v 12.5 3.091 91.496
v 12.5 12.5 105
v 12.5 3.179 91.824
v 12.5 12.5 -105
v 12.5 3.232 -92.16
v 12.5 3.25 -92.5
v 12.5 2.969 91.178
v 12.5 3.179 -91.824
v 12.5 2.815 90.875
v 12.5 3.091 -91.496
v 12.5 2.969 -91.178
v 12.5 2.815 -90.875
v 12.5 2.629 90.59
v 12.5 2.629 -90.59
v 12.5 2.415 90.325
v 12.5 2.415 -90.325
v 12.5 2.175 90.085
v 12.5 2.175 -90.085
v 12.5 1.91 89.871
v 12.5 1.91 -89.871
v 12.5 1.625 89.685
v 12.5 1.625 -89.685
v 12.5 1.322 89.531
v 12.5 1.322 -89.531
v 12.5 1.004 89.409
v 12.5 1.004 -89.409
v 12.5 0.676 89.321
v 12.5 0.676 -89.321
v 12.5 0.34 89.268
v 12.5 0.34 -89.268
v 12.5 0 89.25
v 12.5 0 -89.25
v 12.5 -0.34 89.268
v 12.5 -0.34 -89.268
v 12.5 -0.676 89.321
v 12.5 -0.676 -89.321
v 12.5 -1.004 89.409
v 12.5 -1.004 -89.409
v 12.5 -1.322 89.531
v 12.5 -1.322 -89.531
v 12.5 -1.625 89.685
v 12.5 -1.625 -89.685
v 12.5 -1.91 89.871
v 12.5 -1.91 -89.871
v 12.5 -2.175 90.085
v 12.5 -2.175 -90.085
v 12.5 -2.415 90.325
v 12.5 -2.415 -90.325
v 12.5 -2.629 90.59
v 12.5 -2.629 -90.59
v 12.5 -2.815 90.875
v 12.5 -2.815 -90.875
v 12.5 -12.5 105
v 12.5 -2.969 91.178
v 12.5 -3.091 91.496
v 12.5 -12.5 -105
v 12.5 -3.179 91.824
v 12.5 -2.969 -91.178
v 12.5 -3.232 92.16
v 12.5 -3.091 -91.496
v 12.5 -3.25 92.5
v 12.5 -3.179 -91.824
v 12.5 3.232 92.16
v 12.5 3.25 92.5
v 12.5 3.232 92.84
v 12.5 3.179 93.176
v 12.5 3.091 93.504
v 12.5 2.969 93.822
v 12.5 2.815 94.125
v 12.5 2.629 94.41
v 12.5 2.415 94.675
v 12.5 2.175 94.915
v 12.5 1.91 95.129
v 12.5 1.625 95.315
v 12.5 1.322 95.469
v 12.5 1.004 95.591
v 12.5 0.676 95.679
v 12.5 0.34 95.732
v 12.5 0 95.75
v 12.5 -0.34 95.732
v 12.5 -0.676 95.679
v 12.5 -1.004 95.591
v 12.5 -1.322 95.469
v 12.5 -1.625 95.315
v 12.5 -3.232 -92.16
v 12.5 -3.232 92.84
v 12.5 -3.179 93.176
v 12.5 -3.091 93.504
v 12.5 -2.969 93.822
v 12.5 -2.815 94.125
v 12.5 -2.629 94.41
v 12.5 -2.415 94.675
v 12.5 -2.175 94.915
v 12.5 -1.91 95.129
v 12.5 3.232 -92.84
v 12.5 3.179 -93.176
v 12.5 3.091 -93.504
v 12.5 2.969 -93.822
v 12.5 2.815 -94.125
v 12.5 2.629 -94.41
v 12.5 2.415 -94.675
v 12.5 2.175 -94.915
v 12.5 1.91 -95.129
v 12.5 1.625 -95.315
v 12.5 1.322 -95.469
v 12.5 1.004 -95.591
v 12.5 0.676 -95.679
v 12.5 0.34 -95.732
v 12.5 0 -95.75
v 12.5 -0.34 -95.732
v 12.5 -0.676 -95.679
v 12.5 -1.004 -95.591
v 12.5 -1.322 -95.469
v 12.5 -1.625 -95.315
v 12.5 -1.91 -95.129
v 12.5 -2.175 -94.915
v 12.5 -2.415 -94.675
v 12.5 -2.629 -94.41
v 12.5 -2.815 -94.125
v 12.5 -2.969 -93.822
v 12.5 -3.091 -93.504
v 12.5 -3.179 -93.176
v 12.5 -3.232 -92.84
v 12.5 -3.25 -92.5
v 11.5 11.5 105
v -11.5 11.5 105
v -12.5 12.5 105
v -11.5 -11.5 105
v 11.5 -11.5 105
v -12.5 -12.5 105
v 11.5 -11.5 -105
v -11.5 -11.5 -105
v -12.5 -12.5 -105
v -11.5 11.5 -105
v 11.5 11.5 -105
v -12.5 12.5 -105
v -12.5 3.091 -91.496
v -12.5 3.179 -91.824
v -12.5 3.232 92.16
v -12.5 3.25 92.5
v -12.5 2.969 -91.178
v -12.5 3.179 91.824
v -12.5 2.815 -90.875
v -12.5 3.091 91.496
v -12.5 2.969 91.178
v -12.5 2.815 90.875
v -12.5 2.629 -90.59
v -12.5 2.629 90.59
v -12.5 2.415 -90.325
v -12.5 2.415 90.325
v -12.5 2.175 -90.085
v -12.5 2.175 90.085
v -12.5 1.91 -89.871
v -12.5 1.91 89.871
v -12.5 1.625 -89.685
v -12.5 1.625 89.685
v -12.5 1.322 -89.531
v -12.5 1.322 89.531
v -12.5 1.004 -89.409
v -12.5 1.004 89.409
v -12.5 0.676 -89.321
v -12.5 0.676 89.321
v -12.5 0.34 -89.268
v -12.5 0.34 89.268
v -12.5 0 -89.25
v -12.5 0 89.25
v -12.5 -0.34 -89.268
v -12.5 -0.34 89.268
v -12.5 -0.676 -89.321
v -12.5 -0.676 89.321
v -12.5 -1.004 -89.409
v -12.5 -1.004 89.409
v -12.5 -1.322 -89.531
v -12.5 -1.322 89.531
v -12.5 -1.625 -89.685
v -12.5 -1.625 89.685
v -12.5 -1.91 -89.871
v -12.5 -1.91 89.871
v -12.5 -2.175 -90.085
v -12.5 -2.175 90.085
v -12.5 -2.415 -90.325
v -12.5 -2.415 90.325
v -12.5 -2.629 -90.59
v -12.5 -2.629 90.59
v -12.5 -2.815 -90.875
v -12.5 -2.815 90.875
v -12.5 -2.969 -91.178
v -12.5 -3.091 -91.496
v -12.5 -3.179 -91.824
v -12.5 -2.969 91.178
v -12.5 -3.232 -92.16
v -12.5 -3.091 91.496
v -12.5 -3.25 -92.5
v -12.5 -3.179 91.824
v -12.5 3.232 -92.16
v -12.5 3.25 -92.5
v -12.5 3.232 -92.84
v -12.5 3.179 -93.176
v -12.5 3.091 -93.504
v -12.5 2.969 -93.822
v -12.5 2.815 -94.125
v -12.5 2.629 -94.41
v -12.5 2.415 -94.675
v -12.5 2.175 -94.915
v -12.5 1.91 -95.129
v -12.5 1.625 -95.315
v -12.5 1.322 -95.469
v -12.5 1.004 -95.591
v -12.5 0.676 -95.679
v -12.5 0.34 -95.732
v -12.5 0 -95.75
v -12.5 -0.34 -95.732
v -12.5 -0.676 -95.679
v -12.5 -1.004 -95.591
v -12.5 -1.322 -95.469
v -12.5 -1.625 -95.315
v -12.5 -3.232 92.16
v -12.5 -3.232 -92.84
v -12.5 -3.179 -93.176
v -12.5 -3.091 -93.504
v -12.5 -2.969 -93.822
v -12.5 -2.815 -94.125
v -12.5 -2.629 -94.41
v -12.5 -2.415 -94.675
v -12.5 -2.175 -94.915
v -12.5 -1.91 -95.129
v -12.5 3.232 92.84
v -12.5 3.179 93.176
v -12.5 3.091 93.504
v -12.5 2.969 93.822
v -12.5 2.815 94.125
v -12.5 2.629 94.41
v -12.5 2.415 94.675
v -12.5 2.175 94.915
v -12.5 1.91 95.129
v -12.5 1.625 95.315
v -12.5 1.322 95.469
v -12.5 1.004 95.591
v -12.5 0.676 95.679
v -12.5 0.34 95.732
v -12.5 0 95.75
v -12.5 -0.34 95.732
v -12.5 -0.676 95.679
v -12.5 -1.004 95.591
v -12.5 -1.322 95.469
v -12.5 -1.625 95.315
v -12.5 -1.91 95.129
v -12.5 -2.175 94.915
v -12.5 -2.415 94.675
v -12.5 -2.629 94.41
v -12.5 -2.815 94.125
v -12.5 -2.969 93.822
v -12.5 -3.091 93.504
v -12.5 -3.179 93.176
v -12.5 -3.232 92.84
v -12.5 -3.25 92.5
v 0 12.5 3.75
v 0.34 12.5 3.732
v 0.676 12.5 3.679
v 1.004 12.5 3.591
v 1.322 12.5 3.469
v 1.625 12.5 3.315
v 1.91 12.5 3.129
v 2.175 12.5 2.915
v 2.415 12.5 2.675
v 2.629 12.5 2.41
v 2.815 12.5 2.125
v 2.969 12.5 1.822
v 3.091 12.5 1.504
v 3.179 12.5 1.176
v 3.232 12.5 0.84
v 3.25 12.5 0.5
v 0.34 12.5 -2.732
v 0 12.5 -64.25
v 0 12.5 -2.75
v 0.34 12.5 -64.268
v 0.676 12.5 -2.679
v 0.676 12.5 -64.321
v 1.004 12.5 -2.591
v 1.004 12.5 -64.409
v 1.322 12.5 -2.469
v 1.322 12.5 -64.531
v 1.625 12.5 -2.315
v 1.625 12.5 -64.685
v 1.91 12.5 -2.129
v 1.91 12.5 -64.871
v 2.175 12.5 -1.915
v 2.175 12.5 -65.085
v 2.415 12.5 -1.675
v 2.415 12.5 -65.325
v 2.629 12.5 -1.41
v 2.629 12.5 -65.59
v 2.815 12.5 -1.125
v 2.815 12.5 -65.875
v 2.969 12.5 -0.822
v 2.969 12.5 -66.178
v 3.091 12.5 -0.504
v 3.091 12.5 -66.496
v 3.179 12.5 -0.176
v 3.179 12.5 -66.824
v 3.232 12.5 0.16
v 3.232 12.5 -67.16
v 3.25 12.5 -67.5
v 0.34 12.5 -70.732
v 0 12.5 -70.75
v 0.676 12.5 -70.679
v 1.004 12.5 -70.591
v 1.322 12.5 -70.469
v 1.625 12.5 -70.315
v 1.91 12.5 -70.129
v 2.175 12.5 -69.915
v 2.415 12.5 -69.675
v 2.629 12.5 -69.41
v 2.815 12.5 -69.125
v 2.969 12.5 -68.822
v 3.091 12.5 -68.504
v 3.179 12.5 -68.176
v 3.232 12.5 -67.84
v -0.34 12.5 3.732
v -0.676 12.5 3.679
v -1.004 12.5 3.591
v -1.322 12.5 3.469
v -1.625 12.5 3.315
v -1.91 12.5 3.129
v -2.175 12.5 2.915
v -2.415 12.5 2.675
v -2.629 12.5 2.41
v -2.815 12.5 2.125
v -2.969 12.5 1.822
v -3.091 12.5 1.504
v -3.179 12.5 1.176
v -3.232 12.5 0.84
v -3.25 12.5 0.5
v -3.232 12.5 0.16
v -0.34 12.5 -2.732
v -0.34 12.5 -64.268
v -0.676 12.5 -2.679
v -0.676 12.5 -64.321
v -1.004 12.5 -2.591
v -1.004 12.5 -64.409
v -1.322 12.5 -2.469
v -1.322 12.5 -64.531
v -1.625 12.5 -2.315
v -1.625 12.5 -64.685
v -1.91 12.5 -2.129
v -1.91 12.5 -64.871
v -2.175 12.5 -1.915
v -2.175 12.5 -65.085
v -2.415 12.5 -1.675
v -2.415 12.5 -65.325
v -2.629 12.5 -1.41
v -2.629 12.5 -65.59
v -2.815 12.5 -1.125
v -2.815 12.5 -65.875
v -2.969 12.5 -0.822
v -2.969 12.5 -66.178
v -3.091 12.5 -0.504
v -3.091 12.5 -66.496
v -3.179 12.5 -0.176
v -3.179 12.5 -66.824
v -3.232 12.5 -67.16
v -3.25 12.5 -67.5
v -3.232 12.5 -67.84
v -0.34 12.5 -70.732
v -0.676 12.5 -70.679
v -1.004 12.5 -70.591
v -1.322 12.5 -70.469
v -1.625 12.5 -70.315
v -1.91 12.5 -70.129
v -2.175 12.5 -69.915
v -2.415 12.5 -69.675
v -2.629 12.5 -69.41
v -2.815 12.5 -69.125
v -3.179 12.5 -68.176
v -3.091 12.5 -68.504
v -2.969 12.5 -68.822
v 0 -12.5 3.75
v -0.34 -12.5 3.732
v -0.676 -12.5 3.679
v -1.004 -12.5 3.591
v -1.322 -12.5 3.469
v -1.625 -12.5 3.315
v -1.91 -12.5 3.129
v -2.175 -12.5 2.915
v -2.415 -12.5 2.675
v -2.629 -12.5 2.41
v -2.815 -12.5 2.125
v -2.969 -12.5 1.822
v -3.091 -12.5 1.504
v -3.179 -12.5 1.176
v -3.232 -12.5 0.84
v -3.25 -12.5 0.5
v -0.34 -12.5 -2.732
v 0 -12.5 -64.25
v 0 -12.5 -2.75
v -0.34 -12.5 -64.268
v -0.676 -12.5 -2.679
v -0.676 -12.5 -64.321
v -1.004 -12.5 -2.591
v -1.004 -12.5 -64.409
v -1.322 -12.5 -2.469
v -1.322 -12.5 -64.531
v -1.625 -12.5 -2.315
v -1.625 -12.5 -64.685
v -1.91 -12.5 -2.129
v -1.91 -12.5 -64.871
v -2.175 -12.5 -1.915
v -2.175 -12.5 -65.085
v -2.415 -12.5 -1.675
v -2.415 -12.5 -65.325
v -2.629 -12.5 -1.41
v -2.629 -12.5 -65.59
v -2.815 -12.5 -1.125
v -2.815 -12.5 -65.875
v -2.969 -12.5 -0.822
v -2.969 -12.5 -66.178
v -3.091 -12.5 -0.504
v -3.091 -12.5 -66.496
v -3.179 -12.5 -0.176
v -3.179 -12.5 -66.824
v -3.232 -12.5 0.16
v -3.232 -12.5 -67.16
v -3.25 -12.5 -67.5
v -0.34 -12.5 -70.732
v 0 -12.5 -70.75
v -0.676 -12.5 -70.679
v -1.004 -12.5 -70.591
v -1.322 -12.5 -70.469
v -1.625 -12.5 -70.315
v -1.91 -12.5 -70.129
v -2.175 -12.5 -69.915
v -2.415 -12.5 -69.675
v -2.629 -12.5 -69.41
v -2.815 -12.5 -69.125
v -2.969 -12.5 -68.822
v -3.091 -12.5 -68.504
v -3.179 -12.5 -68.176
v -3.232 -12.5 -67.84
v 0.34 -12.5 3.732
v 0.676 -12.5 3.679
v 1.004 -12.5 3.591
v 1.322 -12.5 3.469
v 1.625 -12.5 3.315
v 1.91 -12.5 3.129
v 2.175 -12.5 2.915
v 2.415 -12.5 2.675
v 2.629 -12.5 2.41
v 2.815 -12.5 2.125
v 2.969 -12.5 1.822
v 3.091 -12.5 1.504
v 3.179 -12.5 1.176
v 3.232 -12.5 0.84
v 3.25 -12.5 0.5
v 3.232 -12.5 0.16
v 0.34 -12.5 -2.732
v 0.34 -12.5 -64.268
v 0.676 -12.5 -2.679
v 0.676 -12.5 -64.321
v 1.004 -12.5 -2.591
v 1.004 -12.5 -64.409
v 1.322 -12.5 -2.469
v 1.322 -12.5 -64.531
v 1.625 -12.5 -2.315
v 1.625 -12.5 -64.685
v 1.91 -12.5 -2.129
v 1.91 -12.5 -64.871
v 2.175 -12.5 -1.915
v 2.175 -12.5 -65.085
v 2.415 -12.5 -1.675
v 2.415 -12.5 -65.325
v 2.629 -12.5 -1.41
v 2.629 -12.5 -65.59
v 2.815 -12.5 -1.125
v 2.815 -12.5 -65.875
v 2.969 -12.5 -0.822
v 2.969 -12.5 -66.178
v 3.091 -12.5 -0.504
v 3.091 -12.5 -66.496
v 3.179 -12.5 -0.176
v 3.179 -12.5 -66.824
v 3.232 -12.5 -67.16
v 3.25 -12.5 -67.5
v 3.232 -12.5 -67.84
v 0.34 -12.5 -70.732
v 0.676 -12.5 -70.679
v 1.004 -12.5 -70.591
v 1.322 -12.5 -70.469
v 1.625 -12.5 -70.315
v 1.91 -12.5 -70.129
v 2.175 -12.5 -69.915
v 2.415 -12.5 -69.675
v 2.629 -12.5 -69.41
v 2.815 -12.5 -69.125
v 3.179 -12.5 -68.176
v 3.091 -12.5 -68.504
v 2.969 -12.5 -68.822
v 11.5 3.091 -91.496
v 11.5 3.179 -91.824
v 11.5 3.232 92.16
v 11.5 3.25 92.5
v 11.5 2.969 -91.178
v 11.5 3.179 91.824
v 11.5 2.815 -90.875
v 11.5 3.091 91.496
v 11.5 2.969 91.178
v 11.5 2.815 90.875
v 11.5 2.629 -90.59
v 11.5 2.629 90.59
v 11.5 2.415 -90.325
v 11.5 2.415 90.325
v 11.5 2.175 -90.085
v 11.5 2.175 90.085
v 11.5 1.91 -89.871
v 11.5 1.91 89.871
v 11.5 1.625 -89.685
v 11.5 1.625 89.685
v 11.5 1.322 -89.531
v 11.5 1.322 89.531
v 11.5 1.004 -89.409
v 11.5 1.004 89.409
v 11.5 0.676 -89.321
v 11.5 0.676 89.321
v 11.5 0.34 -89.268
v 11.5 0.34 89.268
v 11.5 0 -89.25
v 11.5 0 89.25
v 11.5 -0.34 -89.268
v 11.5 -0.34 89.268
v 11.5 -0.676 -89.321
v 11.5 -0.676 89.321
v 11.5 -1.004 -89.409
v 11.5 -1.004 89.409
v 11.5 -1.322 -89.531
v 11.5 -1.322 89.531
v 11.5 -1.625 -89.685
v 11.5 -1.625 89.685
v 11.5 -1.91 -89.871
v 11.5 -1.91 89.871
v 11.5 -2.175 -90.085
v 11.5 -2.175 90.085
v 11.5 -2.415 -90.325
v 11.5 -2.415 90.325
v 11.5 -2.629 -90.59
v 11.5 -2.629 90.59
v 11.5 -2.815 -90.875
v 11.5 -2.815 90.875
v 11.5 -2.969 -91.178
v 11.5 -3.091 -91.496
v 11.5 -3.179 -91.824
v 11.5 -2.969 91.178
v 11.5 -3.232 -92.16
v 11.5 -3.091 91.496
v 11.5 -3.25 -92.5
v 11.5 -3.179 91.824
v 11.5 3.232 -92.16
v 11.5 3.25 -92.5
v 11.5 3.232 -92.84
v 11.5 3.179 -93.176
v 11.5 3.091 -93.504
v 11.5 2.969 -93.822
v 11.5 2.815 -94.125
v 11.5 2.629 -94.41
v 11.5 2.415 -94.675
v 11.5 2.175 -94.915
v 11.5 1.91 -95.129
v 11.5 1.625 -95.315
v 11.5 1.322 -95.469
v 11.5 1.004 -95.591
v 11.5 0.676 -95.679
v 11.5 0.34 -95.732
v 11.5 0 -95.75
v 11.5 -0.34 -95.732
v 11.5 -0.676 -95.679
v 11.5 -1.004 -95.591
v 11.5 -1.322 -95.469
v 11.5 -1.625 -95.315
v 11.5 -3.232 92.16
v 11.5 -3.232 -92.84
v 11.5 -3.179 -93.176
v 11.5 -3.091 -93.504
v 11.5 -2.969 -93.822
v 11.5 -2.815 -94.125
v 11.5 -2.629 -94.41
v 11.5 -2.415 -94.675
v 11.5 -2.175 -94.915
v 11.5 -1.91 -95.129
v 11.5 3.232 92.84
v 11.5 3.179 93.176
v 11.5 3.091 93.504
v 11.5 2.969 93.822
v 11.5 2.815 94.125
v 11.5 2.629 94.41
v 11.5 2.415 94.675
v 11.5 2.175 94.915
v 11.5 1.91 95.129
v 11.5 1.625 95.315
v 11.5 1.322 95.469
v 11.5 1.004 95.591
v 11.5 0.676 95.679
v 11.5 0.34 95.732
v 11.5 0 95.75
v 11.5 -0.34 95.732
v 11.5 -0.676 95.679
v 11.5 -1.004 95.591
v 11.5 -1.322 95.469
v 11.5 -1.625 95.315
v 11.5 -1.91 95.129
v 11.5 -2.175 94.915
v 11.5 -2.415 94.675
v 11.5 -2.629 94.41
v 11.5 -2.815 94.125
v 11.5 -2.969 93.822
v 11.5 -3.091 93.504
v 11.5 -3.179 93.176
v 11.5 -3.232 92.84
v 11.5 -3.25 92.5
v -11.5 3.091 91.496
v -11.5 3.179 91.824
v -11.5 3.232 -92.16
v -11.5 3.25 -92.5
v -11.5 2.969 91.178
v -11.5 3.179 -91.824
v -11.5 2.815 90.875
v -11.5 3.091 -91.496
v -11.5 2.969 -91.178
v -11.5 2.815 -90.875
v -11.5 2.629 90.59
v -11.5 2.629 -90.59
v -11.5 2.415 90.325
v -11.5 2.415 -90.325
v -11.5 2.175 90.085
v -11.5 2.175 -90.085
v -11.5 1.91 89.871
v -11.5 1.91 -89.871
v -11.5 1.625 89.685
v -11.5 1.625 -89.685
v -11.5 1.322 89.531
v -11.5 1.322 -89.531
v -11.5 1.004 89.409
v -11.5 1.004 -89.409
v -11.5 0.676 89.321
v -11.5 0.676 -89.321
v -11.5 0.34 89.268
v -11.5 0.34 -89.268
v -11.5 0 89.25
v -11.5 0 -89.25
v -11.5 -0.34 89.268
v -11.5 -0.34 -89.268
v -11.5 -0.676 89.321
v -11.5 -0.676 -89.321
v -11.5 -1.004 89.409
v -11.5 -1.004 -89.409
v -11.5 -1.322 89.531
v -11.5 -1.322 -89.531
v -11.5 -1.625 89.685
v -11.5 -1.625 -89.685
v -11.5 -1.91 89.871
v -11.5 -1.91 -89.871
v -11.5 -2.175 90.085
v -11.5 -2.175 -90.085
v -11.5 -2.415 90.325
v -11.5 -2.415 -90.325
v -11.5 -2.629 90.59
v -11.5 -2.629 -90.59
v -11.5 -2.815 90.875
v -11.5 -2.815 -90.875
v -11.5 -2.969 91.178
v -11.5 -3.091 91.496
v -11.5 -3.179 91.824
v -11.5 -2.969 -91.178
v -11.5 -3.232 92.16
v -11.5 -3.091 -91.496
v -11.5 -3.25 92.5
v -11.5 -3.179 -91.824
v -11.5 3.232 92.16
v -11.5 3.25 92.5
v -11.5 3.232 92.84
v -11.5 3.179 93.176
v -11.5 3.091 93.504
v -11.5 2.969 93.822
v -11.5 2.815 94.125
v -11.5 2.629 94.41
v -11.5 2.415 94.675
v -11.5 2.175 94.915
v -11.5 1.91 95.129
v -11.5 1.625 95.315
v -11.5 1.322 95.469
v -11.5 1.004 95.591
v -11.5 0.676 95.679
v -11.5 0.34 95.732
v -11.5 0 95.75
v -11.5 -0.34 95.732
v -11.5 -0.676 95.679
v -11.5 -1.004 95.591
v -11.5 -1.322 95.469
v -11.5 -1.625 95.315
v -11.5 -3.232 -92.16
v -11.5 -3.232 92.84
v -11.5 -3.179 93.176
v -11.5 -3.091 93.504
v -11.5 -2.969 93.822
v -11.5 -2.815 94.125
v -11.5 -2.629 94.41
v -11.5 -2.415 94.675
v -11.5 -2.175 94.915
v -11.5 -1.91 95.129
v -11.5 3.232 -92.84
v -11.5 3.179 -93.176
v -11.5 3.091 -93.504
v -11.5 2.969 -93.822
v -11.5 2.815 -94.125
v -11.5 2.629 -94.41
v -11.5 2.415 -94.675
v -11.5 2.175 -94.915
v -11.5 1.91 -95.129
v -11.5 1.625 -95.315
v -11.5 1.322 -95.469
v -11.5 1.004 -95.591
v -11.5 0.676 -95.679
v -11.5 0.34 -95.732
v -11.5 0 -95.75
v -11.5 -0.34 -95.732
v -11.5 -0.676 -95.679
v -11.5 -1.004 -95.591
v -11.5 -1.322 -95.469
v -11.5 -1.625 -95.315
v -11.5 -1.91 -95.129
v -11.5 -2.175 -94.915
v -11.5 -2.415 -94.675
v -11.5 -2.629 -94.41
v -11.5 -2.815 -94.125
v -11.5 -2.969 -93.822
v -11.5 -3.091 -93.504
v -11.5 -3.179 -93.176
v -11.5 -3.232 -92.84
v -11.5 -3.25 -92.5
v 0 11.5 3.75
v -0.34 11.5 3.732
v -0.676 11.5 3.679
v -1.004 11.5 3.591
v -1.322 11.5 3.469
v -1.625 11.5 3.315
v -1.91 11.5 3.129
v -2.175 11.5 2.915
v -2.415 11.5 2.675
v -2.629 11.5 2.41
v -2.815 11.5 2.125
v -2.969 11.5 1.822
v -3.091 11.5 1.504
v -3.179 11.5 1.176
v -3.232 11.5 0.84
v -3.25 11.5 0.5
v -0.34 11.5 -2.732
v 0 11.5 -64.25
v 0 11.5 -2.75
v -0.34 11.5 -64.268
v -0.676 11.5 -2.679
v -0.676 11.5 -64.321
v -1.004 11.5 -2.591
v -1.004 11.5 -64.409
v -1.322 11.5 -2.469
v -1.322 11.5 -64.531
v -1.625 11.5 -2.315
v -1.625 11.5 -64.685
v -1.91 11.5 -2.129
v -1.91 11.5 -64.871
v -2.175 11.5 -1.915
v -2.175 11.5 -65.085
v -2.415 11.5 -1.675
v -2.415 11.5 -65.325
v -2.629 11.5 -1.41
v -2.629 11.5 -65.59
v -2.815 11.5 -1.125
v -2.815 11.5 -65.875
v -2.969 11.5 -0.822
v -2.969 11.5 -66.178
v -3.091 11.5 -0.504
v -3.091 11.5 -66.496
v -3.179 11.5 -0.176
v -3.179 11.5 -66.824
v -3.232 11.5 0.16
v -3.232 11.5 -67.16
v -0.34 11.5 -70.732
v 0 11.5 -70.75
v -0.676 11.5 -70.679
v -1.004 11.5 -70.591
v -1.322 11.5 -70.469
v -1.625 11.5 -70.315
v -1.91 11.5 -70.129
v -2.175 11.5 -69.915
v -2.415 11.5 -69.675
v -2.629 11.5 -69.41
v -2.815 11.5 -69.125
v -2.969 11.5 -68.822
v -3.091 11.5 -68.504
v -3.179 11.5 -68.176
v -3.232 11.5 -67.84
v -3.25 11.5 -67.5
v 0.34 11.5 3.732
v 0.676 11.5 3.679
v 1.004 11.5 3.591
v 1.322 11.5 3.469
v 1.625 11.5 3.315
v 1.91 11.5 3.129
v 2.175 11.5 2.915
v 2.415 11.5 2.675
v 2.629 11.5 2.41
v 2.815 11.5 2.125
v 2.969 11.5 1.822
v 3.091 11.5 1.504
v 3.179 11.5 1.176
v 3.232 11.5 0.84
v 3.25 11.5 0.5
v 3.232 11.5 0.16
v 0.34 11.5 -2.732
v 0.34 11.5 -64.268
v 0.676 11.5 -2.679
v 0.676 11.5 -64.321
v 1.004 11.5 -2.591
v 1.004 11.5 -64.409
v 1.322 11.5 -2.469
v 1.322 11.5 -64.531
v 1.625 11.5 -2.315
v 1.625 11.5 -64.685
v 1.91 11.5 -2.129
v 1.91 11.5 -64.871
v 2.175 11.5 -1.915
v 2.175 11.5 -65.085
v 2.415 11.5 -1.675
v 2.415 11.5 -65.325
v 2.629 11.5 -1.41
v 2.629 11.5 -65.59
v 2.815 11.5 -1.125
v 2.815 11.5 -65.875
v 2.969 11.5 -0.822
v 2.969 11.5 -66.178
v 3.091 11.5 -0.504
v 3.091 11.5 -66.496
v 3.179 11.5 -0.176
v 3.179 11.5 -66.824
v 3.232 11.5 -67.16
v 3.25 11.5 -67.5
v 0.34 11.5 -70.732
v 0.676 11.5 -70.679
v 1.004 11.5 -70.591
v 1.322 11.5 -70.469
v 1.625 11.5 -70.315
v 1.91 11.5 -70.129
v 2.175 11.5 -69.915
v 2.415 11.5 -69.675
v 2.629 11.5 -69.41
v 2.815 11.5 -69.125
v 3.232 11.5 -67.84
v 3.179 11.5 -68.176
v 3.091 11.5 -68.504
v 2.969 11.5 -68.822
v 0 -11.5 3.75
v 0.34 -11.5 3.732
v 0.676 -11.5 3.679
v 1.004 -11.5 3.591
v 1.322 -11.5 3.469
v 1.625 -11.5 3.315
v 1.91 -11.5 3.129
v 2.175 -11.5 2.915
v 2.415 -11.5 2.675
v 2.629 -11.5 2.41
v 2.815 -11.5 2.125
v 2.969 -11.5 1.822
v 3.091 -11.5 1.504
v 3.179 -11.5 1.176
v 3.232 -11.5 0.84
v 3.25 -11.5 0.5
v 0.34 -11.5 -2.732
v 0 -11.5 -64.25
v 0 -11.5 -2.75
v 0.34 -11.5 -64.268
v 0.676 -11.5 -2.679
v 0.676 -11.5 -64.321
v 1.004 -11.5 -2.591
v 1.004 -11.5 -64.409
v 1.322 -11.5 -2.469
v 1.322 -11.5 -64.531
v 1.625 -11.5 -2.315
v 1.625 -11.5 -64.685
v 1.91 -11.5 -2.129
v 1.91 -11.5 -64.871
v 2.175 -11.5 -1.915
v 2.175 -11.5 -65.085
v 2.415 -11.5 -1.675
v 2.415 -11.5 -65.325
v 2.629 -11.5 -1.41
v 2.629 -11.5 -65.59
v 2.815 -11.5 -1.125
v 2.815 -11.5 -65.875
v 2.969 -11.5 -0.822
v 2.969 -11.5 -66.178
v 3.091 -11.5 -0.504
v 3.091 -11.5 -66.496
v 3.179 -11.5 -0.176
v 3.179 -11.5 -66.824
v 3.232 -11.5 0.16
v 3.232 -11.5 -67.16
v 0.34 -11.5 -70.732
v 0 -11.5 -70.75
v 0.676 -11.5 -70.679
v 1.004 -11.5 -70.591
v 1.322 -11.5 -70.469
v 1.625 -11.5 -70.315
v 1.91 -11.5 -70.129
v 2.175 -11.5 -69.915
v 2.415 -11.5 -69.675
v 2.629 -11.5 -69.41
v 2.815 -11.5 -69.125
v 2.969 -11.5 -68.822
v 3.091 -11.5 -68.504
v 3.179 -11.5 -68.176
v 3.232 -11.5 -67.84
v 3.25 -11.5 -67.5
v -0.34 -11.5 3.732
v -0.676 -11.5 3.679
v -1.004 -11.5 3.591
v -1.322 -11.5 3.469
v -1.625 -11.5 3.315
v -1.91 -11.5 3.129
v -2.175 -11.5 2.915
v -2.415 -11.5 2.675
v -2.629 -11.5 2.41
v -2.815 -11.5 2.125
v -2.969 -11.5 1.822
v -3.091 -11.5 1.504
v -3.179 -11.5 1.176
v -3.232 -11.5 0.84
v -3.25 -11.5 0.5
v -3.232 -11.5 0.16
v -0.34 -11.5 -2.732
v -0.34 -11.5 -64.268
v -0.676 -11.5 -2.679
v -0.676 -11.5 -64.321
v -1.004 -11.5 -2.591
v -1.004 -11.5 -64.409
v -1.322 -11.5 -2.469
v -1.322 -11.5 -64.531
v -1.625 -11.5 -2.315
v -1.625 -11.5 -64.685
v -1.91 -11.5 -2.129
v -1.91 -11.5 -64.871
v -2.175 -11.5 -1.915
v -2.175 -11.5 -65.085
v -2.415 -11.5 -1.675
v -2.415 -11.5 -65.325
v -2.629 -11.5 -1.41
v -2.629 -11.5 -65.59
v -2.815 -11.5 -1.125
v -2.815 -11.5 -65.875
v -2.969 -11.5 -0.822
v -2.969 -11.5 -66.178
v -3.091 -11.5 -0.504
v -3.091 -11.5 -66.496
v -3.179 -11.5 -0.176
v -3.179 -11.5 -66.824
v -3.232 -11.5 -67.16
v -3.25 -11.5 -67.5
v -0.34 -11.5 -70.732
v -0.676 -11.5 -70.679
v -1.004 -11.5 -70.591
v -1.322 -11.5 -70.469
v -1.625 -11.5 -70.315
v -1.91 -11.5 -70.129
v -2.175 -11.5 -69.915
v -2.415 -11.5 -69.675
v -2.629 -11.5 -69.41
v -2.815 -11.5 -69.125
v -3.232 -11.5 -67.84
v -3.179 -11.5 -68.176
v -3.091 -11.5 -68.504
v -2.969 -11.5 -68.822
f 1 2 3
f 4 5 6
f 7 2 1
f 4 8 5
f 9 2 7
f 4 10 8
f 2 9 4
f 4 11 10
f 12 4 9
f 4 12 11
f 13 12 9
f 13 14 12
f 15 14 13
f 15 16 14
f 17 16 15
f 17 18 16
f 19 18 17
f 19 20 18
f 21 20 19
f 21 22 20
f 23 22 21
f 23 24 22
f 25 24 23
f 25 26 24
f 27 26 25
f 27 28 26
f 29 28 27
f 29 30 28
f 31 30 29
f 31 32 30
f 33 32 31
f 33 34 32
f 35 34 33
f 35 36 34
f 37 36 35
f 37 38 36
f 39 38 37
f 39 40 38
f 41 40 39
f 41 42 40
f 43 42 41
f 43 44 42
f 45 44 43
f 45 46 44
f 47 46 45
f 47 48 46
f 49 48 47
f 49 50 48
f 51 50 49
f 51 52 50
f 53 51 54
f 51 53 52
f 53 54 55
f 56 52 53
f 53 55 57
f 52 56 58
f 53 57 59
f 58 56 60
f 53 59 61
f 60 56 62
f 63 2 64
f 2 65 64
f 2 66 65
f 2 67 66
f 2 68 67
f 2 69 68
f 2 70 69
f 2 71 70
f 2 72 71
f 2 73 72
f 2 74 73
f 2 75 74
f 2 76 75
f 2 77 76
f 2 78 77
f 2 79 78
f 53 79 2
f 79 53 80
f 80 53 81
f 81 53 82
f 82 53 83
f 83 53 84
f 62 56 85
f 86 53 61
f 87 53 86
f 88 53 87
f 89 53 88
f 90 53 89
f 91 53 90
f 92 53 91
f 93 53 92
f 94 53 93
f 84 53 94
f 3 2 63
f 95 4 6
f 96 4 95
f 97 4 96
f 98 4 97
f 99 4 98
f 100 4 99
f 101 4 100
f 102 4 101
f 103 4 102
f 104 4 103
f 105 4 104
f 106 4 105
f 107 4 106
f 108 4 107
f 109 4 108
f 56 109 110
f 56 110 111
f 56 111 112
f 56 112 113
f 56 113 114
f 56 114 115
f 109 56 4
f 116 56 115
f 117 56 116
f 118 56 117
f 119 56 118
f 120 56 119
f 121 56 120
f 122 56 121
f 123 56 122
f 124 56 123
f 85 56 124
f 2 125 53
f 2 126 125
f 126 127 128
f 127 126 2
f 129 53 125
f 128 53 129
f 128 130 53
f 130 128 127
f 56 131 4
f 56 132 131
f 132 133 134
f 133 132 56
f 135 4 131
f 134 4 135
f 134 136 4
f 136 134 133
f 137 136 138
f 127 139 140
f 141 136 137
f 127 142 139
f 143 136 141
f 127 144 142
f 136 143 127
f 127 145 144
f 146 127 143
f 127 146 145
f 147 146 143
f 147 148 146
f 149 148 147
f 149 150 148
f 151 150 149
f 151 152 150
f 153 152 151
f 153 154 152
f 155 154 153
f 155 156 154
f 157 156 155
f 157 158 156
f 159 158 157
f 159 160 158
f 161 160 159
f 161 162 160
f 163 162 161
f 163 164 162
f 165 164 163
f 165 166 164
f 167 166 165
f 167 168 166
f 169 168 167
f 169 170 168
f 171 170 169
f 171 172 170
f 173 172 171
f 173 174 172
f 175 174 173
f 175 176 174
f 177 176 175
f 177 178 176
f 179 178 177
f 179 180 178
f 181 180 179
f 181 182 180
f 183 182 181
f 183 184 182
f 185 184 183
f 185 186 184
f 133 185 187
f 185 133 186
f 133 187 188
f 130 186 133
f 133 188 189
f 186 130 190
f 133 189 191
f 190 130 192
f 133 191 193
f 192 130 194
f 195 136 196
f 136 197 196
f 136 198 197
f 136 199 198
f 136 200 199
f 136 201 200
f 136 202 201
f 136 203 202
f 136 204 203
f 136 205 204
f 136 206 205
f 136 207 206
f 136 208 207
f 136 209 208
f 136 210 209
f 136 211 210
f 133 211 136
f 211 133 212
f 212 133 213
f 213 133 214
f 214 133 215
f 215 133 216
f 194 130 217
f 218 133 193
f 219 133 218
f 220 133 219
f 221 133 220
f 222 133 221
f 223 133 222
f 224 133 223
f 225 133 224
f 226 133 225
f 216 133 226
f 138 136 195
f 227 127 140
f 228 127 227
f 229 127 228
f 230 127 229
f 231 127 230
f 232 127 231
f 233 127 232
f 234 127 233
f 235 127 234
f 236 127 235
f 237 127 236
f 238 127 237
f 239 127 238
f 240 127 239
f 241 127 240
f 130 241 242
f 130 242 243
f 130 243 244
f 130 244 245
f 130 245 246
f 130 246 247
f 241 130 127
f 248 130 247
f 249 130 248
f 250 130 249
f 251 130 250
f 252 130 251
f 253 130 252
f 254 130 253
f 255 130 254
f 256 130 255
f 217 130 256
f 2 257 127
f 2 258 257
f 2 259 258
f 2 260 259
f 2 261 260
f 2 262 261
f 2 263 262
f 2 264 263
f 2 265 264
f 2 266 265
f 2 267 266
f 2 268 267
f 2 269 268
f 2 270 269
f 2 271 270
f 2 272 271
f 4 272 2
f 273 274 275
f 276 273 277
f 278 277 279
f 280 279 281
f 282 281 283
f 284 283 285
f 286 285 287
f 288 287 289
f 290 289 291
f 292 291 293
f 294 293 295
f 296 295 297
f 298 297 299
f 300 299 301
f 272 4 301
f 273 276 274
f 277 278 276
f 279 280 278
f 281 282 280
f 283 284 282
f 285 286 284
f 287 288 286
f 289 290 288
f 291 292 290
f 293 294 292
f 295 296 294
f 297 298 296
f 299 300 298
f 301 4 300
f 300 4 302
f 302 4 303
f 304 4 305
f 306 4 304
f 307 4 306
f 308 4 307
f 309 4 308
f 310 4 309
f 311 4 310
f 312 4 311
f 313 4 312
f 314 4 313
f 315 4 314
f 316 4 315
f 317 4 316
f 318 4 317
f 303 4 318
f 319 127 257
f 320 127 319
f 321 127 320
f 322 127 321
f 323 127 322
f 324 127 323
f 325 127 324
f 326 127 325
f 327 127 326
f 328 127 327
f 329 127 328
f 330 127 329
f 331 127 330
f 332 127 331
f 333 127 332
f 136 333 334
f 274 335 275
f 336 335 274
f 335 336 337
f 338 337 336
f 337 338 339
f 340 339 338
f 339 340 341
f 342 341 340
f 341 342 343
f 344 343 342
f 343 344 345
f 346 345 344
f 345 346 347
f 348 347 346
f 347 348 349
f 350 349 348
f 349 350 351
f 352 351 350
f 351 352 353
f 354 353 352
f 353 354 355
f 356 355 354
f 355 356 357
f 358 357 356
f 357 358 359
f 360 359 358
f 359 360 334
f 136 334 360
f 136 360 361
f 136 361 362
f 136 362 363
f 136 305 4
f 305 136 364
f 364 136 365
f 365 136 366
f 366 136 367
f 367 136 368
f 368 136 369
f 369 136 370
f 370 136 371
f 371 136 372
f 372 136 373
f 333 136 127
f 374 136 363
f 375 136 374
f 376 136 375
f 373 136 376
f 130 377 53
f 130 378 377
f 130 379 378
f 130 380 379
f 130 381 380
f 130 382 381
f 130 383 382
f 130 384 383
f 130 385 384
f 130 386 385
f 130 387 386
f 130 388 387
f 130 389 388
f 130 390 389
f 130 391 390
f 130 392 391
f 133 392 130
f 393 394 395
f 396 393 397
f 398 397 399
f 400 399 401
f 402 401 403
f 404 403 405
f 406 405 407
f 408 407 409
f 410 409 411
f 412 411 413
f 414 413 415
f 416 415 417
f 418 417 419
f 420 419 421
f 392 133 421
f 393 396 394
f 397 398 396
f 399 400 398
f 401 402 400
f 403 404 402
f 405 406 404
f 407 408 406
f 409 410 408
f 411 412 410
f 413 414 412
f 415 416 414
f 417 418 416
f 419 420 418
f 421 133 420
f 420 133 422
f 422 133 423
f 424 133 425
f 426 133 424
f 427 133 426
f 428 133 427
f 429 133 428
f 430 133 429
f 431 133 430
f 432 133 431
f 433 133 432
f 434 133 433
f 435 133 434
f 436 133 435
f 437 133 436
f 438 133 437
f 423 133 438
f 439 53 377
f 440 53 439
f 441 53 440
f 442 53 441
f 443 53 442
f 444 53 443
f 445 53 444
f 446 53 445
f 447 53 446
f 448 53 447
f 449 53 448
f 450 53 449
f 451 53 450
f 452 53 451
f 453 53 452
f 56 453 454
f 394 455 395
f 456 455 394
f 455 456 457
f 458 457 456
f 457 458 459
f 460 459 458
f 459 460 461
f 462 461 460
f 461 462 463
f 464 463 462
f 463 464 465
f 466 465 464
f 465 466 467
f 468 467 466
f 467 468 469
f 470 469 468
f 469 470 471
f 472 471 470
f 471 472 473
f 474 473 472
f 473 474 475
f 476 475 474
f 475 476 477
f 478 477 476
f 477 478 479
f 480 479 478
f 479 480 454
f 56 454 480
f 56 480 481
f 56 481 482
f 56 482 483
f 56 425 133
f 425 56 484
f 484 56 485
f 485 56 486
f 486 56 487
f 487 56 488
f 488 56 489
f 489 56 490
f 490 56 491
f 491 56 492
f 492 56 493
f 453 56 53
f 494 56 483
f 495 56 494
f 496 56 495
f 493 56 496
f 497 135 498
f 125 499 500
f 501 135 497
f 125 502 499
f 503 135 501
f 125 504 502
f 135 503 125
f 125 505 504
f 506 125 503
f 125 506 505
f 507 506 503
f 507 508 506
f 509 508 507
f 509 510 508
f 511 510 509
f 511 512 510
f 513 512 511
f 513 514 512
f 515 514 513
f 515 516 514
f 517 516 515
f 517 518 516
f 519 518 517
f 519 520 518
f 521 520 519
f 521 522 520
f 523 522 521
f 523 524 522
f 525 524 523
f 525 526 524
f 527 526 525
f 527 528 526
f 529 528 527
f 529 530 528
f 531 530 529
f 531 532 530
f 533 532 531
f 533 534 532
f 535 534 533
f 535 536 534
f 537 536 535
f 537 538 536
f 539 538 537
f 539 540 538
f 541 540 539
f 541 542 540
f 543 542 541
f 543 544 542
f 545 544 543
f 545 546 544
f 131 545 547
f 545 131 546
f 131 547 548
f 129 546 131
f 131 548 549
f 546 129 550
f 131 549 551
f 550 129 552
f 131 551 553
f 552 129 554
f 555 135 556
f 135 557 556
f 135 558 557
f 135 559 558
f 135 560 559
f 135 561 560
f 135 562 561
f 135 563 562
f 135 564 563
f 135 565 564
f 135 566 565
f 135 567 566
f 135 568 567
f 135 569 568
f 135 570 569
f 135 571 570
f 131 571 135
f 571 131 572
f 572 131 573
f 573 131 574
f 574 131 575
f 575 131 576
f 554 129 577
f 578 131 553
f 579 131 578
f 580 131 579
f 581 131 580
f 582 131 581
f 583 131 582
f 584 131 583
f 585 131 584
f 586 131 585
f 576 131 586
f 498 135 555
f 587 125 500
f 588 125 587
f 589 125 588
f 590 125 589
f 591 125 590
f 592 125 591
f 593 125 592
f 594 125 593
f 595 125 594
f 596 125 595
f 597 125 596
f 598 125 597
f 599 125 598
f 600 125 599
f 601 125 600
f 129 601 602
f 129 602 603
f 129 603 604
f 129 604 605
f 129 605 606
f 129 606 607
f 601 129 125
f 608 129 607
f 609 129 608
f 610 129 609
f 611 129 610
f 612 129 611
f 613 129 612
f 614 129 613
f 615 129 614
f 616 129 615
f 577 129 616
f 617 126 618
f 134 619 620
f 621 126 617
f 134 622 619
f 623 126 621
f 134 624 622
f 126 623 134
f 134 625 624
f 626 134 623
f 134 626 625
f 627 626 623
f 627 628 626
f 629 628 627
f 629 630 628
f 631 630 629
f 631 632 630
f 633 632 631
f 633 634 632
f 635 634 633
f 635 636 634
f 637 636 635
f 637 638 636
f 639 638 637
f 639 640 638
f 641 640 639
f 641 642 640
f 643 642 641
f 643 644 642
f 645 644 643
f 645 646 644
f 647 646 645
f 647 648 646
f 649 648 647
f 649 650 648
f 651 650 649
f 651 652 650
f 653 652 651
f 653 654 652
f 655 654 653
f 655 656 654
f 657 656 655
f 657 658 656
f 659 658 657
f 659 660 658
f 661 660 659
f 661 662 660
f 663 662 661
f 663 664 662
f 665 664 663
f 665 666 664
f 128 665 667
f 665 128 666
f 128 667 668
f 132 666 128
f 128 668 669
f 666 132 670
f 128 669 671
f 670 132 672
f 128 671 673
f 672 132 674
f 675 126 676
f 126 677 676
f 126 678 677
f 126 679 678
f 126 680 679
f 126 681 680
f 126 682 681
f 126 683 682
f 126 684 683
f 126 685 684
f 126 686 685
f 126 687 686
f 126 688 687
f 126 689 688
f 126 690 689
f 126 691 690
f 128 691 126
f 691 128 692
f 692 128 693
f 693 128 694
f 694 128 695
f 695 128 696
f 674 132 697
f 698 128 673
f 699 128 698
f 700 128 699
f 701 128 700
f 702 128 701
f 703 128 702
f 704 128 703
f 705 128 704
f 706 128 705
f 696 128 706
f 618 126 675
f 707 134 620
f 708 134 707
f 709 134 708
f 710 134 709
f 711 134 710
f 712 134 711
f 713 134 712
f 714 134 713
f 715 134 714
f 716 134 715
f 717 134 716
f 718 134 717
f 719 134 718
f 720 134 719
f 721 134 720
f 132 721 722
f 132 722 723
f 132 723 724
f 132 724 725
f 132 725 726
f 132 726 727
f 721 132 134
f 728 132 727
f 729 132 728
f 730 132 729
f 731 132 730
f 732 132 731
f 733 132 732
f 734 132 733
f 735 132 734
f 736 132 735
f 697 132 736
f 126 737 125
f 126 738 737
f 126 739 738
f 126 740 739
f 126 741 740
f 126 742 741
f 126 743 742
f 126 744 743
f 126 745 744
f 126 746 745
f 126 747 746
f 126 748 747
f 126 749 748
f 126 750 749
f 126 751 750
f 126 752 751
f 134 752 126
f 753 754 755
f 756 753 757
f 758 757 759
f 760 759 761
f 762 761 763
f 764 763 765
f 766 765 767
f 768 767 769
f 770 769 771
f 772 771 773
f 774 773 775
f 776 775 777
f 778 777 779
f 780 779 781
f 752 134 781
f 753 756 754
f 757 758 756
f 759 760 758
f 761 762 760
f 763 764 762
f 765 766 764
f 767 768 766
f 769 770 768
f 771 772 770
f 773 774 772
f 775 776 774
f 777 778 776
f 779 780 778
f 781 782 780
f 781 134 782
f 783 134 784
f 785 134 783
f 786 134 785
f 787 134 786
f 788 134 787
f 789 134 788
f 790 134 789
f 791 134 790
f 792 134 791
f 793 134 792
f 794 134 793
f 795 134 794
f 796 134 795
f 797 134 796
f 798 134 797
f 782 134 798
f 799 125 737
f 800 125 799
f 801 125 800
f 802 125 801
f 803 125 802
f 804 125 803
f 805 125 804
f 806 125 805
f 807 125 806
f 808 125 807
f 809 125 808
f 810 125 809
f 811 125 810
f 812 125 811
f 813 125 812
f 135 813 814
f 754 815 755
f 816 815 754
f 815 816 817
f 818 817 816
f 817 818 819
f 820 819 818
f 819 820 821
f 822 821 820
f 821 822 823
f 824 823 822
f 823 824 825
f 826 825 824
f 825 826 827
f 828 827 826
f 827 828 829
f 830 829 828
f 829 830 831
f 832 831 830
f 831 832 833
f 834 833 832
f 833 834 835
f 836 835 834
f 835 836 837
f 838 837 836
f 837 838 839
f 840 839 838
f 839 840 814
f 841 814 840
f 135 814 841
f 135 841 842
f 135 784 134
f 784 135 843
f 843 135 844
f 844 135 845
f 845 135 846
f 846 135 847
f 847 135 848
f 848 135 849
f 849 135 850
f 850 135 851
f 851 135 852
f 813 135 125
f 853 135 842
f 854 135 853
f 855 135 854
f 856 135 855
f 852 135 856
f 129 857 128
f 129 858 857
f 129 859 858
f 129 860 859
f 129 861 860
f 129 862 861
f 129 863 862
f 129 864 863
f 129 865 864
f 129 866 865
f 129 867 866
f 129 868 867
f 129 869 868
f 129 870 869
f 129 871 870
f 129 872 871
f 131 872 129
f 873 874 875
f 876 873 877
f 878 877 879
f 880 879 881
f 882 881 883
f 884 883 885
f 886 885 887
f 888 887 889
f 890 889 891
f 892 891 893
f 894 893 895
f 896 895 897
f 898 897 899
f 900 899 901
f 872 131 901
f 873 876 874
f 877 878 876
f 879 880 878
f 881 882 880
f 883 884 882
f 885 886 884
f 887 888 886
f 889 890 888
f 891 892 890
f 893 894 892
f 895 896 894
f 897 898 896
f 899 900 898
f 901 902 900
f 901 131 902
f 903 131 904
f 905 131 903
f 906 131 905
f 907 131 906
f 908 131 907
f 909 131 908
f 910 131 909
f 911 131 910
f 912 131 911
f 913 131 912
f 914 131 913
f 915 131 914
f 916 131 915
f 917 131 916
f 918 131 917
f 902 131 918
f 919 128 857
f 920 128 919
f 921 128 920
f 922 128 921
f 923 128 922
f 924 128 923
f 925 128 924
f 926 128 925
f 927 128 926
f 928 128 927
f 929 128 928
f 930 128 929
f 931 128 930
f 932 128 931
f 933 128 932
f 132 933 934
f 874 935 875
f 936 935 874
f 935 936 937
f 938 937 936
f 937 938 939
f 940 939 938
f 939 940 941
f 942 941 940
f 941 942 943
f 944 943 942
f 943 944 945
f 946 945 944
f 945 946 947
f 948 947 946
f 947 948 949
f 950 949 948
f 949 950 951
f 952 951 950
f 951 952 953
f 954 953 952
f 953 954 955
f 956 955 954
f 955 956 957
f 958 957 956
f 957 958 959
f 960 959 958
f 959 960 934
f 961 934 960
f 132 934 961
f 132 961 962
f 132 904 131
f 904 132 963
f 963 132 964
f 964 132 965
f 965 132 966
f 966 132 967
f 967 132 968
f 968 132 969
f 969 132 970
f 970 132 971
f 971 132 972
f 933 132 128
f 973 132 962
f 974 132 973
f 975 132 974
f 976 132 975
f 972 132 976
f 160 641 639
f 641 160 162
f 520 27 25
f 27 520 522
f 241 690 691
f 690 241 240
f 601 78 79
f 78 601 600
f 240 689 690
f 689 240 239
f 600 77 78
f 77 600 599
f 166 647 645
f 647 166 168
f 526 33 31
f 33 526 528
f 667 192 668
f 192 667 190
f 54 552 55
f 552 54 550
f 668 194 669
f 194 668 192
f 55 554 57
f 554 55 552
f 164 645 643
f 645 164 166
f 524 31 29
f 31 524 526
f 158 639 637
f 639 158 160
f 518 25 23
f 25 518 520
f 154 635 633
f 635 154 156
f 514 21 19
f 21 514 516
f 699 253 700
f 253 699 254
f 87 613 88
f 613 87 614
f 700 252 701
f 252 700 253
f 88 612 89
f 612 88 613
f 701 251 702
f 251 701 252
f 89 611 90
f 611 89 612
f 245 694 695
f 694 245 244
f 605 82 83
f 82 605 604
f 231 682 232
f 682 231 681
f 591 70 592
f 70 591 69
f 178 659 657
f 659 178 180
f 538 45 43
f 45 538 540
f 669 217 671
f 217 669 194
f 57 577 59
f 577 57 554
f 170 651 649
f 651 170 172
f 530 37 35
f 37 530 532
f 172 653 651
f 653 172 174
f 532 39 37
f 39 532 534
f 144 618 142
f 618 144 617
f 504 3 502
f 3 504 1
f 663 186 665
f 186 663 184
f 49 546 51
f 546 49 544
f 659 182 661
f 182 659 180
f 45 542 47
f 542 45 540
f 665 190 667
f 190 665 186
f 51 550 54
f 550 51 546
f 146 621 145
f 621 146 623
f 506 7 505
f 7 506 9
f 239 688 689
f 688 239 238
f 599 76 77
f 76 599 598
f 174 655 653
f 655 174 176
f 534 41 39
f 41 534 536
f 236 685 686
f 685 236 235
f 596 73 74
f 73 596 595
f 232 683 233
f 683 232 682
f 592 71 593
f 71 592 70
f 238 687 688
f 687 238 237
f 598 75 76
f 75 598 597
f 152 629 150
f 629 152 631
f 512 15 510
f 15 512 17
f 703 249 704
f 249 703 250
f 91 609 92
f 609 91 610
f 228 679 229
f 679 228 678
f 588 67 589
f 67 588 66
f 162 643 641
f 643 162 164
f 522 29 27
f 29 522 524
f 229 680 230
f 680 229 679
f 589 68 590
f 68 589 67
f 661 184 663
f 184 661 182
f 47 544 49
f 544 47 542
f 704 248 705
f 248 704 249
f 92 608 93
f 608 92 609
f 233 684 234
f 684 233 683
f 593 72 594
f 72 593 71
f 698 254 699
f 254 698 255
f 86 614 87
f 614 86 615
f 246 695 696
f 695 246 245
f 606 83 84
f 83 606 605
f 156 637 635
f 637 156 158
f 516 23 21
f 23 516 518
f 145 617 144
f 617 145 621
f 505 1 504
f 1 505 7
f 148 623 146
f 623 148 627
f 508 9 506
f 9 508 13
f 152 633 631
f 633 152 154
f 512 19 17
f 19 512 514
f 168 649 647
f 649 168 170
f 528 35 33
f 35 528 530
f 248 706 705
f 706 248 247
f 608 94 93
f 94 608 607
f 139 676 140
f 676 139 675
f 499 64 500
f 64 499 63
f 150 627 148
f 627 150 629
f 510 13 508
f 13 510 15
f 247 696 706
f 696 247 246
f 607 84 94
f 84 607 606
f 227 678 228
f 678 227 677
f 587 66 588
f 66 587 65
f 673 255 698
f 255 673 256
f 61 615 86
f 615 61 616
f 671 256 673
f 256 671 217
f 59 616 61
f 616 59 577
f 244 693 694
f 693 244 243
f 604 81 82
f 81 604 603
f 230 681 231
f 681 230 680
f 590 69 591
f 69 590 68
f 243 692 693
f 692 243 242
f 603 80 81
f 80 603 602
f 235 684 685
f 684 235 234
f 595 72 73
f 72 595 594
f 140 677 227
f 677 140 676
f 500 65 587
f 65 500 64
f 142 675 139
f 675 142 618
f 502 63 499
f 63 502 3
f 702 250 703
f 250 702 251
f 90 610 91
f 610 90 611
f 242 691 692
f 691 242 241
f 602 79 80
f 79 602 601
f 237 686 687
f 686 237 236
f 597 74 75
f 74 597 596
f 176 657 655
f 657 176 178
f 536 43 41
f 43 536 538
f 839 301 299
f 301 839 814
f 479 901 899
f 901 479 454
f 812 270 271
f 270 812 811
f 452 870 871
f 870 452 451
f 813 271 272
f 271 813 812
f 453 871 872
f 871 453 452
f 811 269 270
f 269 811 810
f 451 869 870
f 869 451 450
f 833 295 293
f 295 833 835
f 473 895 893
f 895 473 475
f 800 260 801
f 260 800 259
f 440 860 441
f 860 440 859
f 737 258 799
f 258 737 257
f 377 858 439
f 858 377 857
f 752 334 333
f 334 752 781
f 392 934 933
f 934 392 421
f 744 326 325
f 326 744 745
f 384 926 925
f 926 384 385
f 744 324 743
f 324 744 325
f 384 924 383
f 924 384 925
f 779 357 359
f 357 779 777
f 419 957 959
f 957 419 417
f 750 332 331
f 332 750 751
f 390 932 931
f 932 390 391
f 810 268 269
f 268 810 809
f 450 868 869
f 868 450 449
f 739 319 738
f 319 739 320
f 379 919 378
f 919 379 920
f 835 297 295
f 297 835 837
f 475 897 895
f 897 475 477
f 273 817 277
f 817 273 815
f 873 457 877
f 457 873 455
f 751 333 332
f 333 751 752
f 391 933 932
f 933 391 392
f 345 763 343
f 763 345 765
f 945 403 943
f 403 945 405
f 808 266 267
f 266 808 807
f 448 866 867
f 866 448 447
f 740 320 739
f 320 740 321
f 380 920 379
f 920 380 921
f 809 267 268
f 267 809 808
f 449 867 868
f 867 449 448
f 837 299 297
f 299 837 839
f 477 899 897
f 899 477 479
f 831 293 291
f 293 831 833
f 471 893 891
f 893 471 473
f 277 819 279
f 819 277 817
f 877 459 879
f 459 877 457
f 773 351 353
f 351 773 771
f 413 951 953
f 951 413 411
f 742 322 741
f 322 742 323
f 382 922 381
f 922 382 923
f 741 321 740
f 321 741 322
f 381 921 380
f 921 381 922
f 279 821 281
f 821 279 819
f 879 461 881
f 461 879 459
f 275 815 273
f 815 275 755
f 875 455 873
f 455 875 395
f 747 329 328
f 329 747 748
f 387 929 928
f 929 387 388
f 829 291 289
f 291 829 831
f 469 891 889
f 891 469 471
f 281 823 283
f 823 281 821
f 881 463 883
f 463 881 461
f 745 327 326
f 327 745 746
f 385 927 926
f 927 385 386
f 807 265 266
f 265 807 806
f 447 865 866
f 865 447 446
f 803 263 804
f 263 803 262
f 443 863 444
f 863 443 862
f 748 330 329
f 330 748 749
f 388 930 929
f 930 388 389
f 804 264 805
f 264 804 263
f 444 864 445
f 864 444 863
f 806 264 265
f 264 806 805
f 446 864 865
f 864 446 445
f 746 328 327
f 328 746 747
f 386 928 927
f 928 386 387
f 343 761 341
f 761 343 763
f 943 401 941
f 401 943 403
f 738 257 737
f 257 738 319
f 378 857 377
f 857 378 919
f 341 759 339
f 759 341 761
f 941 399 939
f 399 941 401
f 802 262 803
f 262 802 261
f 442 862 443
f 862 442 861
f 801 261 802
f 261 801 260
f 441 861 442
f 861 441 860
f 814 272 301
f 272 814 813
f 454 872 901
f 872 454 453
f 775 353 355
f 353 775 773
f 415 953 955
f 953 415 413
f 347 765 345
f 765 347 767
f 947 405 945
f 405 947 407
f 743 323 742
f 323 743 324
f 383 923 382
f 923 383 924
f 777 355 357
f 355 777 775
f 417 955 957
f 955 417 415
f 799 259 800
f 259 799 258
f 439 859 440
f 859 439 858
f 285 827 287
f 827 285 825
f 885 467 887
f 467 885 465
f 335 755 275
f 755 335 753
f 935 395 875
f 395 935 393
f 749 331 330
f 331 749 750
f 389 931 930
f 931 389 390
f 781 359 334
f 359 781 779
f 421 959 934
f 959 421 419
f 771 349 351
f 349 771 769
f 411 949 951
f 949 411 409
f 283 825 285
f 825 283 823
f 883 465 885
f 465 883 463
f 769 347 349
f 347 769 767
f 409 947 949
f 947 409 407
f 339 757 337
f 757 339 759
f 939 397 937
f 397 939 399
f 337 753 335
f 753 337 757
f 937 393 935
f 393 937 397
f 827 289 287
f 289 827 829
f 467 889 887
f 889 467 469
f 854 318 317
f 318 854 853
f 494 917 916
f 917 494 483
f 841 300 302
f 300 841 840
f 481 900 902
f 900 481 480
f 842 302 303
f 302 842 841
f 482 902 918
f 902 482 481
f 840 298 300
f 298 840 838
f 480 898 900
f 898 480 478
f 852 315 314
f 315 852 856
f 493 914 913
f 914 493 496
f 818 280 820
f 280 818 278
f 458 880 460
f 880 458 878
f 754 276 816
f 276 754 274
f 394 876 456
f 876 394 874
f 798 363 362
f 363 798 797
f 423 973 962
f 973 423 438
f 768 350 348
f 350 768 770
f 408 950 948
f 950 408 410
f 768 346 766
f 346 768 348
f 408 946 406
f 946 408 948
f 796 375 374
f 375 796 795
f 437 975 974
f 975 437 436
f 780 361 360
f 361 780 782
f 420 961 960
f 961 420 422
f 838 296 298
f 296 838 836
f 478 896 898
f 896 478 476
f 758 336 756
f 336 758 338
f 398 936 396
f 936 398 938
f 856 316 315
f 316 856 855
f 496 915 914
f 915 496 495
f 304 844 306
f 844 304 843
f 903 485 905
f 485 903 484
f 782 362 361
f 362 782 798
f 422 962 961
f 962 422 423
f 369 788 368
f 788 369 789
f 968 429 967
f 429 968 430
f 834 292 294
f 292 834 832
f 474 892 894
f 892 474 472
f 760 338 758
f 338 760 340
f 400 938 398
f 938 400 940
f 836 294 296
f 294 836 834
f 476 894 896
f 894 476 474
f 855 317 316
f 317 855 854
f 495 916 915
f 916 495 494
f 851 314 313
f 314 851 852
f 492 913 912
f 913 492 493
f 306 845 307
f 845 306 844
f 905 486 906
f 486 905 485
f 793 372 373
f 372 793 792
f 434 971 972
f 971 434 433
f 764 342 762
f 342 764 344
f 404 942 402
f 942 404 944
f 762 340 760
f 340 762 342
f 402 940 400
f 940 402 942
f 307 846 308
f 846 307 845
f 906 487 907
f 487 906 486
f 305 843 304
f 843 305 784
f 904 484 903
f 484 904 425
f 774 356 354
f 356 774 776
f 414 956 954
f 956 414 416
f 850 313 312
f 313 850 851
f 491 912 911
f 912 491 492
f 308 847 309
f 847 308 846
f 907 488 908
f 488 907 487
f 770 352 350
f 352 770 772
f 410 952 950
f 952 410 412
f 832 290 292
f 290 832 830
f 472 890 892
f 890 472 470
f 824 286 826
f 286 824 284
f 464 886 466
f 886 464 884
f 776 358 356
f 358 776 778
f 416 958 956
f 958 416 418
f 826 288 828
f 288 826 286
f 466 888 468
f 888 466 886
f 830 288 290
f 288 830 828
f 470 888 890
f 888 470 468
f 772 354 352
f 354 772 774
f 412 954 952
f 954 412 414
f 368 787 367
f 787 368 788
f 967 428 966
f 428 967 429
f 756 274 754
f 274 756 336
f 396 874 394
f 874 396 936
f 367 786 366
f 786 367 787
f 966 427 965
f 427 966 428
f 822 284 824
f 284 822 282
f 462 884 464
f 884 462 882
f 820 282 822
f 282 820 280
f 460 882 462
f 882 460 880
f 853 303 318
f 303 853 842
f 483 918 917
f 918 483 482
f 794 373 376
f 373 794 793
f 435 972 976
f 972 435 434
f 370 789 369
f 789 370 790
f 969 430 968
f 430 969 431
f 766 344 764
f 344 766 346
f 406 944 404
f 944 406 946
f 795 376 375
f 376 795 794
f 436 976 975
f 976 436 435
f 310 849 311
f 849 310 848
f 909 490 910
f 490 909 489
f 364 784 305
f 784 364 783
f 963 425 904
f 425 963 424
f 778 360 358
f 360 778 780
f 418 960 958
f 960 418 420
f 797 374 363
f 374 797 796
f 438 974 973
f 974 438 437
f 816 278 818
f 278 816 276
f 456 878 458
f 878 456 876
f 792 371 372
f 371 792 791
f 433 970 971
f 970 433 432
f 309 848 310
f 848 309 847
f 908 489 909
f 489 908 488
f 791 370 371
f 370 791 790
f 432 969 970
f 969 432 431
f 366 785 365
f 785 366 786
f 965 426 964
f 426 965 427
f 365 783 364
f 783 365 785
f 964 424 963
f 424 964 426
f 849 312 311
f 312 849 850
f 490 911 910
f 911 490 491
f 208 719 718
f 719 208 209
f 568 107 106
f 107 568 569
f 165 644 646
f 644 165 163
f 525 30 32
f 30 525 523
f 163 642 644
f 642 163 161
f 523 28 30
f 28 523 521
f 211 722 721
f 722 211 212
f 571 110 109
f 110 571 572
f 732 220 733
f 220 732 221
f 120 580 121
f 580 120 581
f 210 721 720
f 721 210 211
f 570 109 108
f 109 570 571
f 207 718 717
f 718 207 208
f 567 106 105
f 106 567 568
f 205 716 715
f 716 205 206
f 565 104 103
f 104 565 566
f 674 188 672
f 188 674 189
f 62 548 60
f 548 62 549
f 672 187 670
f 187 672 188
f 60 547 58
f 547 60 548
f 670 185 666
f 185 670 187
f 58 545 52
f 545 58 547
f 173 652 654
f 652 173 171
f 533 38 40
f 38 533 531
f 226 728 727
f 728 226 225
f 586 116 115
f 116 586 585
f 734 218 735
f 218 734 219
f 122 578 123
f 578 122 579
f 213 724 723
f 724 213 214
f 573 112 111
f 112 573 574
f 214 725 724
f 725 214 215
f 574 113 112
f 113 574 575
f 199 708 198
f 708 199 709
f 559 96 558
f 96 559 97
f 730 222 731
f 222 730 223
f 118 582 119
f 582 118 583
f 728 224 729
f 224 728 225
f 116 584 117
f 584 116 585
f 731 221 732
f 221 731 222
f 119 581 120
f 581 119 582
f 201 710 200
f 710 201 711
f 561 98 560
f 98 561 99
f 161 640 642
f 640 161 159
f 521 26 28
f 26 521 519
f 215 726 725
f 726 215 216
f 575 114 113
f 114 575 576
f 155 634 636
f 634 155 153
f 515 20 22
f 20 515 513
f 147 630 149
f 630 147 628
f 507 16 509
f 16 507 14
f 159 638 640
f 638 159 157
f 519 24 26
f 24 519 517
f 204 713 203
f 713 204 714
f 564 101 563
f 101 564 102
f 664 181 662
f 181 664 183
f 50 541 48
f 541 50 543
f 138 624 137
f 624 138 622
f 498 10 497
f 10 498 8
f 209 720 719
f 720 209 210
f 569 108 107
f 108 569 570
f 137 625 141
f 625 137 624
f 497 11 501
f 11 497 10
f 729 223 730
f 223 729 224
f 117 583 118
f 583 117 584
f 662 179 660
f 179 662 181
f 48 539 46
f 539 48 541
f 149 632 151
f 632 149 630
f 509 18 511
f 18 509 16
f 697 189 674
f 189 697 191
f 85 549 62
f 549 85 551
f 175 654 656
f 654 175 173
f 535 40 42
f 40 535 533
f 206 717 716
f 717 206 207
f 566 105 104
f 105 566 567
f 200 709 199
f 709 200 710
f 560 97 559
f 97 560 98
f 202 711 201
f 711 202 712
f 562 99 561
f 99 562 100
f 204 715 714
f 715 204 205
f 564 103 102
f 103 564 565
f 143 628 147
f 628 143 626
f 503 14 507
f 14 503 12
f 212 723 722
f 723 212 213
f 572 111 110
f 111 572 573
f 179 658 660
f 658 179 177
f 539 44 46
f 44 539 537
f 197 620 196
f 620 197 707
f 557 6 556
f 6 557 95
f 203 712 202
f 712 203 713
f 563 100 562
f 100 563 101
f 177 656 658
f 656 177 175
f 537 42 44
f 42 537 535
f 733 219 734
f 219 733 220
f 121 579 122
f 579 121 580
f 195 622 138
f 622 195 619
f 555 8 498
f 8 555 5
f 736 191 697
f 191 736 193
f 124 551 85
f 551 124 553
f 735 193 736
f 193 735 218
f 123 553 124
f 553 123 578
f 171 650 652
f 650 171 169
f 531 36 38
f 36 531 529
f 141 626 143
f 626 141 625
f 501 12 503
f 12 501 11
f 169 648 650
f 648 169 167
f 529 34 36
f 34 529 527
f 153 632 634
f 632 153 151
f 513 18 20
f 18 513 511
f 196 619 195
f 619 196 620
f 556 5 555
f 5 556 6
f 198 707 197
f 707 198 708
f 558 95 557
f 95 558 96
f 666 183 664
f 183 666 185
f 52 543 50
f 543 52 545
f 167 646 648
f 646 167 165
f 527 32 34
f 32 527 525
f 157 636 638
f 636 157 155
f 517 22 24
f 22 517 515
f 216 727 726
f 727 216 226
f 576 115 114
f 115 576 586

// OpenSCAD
// file: base_structures.scad
$fn=60;

d_square=25;
d_thickness=2;
d_length=1000;
d_hole_r=6.5/2;
d_hole_l=50;


module aluminium_square(sqaure=d_square, thickness=d_thickness, length=d_length,)
{
  color("Grey") difference() 
  {
    cube([sqaure, sqaure, length], center=true);
    cube([sqaure-thickness, sqaure-thickness, length+100], center=true);
  }

}

module aluminium_square_x(square=d_square, thickness=d_thickness, length=d_length,)
{
    rotate([0,90,0]) aluminium_square(square=square, thickness=thickness, length=	length);
}

module aluminium_square_y(square=d_square, thickness=d_thickness, length=d_length)
{
    rotate([90,0,0]) aluminium_square(square=square, thickness=thickness, length=length);
}

module aluminium_square_z(square=d_square, thickness=d_thickness, length=d_length,)
{
    rotate([0,0,0]) aluminium_square(sqaure=square, thickness=thickness, length=length);
}


module hole(hole_r=d_hole_r, hole_l=d_hole_l, t_x=0, t_y=0, t_z=0)
{
  translate([t_x, t_y, t_z])  cylinder(h=hole_l,r=hole_r, center=true);
}

module hole_x(hole_r=d_hole_r, hole_l=d_hole_l, t_x=0, t_y=0, t_z=0)
{
    rotate([0,90,0]) hole(hole_r=hole_r, hole_l=hole_l, t_x=t_x, t_y=t_y, t_z=t_z);
}

module hole_y(hole_r=d_hole_r, hole_l=d_hole_l, t_x=0, t_y=0, t_z=0)
{
    rotate([90,0,0]) hole(hole_r=hole_r, hole_l=hole_l, t_x=t_x, t_y=t_y, t_z=t_z);
}

module hole_z(hole_r=d_hole_r, hole_l=d_hole_l, t_x=0, t_y=0, t_z=0)
{
    rotate([0,0,0]) hole(hole_r=hole_r, hole_l=hole_l, t_x=t_x, t_y=t_y, t_z=t_z);
}
// main file
include <base_structures.scad>;

l_FR_1a=1500;
l_FR_1b=1500;
l_FR_2a=210;
l_FR_2b=260;
l_FR_2c=210;

module FR_1a()
{
  color("green") difference()
  {
    aluminium_square_y(length=l_FR_1a );

    // Set starting point for holes to be top of bar
    translate([0,l_FR_1a /2 ,0]) 
    {
      hole_x(t_y=-12.5);
      hole_x(t_y=-47.5);
      hole_x(t_y=-411.5);
      hole_z(t_y=-436.5);
      hole_x(t_y=-(l_FR_1a -635));
      hole_z(t_y=-(l_FR_1a -610));
      hole_x(t_y=-(l_FR_1a -585));
      hole_x(t_y=-(l_FR_1a -97.5));
      hole_x(t_y=-(l_FR_1a -62.5));
      hole_x(t_y=-(l_FR_1a -37.5));
      hole_z(t_y=-(l_FR_1a -12.5));
    }
  }
}

module FR_1b()
{
  color("green") difference()
  {
    aluminium_square_y(length=l_FR_1b);

    // Set starting point for holes to be top of bar
    translate([0,l_FR_1b/2 ,0]) 
    {
      hole_x(t_y=-12.5);
      hole_x(t_y=-47.5);
      hole_x(t_y=-411.5);
      hole_z(t_y=-436.5);
      hole_z(t_y=-(l_FR_1b -610));
      hole_x(t_y=-(l_FR_1b -97.5));
      hole_x(t_y=-(l_FR_1b -62.5));
      hole_x(t_y=-(l_FR_1b -37.5));
      hole_z(t_y=-(l_FR_1b -12.5));
    }
  }
}



module FR_2a()
{
  color("red") difference()
  {
    aluminium_square_z(length=l_FR_2a);

    // Set starting point for holes to be top of bar
    translate([0,0,l_FR_2a/2]) 
    {
      hole_x(t_x=12.5);
      hole_y(t_y=-37.5);
      hole_x(t_x=l_FR_2a-12.5);
      hole_y(t_y=-l_FR_2a+37.5);

    }
  }
}

module FR_2b()
{
  color("gold") difference()
  {
    aluminium_square_z(length=l_FR_2b);

    // Set starting point for holes to be top of bar
    translate([0,0,l_FR_2b/2]) 
    {
      hole_y(t_y=-12.5);
      hole_x(t_x=37.5);
      hole_x(t_x=l_FR_2b-179);
      hole_x(t_x=l_FR_2b-95);
      hole_x(t_x=l_FR_2b-37.5);
      hole_y(t_y=-l_FR_2b+12.5);
    }
  }
}

module FR_2c()
{
  color("darkorange") difference()
  {
    aluminium_square_z(length=l_FR_2c);

    // Set starting point for holes to be top of bar
    translate([0,0,l_FR_2c/2]) 
    {
      hole_x(t_x=12.5);
      hole_y(t_y=-l_FR_2c+105.5);
      hole_y(t_y=-l_FR_2c+37.5);
      hole_x(t_x=l_FR_2c-12.5);
    }
  }
}

FR_2c();
